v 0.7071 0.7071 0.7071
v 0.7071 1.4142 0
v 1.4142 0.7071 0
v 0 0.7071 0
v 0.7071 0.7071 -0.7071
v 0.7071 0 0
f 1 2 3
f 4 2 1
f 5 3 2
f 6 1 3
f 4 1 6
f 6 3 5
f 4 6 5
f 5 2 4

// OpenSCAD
module octahedron(a=1, center=false){
    points = [
        [1,0,0],
        [0,1,0],
        [0,0,1],
        [-1,0,0],
        [0,-1,0],
        [0,0,-1]
    ];
    faces = [
        [0,1,2],
        [2,1,3],
        [1,0,5],
        [0,2,4],
        [4,2,3],
        [5,0,4],
        [5,4,3],
        [3,1,5]
    ];
    scale(1/sqrt(2)) 
    translate(center ? [0,0,0]: [1,1,0])
    polyhedron(points*a, faces);
}

octahedron();
